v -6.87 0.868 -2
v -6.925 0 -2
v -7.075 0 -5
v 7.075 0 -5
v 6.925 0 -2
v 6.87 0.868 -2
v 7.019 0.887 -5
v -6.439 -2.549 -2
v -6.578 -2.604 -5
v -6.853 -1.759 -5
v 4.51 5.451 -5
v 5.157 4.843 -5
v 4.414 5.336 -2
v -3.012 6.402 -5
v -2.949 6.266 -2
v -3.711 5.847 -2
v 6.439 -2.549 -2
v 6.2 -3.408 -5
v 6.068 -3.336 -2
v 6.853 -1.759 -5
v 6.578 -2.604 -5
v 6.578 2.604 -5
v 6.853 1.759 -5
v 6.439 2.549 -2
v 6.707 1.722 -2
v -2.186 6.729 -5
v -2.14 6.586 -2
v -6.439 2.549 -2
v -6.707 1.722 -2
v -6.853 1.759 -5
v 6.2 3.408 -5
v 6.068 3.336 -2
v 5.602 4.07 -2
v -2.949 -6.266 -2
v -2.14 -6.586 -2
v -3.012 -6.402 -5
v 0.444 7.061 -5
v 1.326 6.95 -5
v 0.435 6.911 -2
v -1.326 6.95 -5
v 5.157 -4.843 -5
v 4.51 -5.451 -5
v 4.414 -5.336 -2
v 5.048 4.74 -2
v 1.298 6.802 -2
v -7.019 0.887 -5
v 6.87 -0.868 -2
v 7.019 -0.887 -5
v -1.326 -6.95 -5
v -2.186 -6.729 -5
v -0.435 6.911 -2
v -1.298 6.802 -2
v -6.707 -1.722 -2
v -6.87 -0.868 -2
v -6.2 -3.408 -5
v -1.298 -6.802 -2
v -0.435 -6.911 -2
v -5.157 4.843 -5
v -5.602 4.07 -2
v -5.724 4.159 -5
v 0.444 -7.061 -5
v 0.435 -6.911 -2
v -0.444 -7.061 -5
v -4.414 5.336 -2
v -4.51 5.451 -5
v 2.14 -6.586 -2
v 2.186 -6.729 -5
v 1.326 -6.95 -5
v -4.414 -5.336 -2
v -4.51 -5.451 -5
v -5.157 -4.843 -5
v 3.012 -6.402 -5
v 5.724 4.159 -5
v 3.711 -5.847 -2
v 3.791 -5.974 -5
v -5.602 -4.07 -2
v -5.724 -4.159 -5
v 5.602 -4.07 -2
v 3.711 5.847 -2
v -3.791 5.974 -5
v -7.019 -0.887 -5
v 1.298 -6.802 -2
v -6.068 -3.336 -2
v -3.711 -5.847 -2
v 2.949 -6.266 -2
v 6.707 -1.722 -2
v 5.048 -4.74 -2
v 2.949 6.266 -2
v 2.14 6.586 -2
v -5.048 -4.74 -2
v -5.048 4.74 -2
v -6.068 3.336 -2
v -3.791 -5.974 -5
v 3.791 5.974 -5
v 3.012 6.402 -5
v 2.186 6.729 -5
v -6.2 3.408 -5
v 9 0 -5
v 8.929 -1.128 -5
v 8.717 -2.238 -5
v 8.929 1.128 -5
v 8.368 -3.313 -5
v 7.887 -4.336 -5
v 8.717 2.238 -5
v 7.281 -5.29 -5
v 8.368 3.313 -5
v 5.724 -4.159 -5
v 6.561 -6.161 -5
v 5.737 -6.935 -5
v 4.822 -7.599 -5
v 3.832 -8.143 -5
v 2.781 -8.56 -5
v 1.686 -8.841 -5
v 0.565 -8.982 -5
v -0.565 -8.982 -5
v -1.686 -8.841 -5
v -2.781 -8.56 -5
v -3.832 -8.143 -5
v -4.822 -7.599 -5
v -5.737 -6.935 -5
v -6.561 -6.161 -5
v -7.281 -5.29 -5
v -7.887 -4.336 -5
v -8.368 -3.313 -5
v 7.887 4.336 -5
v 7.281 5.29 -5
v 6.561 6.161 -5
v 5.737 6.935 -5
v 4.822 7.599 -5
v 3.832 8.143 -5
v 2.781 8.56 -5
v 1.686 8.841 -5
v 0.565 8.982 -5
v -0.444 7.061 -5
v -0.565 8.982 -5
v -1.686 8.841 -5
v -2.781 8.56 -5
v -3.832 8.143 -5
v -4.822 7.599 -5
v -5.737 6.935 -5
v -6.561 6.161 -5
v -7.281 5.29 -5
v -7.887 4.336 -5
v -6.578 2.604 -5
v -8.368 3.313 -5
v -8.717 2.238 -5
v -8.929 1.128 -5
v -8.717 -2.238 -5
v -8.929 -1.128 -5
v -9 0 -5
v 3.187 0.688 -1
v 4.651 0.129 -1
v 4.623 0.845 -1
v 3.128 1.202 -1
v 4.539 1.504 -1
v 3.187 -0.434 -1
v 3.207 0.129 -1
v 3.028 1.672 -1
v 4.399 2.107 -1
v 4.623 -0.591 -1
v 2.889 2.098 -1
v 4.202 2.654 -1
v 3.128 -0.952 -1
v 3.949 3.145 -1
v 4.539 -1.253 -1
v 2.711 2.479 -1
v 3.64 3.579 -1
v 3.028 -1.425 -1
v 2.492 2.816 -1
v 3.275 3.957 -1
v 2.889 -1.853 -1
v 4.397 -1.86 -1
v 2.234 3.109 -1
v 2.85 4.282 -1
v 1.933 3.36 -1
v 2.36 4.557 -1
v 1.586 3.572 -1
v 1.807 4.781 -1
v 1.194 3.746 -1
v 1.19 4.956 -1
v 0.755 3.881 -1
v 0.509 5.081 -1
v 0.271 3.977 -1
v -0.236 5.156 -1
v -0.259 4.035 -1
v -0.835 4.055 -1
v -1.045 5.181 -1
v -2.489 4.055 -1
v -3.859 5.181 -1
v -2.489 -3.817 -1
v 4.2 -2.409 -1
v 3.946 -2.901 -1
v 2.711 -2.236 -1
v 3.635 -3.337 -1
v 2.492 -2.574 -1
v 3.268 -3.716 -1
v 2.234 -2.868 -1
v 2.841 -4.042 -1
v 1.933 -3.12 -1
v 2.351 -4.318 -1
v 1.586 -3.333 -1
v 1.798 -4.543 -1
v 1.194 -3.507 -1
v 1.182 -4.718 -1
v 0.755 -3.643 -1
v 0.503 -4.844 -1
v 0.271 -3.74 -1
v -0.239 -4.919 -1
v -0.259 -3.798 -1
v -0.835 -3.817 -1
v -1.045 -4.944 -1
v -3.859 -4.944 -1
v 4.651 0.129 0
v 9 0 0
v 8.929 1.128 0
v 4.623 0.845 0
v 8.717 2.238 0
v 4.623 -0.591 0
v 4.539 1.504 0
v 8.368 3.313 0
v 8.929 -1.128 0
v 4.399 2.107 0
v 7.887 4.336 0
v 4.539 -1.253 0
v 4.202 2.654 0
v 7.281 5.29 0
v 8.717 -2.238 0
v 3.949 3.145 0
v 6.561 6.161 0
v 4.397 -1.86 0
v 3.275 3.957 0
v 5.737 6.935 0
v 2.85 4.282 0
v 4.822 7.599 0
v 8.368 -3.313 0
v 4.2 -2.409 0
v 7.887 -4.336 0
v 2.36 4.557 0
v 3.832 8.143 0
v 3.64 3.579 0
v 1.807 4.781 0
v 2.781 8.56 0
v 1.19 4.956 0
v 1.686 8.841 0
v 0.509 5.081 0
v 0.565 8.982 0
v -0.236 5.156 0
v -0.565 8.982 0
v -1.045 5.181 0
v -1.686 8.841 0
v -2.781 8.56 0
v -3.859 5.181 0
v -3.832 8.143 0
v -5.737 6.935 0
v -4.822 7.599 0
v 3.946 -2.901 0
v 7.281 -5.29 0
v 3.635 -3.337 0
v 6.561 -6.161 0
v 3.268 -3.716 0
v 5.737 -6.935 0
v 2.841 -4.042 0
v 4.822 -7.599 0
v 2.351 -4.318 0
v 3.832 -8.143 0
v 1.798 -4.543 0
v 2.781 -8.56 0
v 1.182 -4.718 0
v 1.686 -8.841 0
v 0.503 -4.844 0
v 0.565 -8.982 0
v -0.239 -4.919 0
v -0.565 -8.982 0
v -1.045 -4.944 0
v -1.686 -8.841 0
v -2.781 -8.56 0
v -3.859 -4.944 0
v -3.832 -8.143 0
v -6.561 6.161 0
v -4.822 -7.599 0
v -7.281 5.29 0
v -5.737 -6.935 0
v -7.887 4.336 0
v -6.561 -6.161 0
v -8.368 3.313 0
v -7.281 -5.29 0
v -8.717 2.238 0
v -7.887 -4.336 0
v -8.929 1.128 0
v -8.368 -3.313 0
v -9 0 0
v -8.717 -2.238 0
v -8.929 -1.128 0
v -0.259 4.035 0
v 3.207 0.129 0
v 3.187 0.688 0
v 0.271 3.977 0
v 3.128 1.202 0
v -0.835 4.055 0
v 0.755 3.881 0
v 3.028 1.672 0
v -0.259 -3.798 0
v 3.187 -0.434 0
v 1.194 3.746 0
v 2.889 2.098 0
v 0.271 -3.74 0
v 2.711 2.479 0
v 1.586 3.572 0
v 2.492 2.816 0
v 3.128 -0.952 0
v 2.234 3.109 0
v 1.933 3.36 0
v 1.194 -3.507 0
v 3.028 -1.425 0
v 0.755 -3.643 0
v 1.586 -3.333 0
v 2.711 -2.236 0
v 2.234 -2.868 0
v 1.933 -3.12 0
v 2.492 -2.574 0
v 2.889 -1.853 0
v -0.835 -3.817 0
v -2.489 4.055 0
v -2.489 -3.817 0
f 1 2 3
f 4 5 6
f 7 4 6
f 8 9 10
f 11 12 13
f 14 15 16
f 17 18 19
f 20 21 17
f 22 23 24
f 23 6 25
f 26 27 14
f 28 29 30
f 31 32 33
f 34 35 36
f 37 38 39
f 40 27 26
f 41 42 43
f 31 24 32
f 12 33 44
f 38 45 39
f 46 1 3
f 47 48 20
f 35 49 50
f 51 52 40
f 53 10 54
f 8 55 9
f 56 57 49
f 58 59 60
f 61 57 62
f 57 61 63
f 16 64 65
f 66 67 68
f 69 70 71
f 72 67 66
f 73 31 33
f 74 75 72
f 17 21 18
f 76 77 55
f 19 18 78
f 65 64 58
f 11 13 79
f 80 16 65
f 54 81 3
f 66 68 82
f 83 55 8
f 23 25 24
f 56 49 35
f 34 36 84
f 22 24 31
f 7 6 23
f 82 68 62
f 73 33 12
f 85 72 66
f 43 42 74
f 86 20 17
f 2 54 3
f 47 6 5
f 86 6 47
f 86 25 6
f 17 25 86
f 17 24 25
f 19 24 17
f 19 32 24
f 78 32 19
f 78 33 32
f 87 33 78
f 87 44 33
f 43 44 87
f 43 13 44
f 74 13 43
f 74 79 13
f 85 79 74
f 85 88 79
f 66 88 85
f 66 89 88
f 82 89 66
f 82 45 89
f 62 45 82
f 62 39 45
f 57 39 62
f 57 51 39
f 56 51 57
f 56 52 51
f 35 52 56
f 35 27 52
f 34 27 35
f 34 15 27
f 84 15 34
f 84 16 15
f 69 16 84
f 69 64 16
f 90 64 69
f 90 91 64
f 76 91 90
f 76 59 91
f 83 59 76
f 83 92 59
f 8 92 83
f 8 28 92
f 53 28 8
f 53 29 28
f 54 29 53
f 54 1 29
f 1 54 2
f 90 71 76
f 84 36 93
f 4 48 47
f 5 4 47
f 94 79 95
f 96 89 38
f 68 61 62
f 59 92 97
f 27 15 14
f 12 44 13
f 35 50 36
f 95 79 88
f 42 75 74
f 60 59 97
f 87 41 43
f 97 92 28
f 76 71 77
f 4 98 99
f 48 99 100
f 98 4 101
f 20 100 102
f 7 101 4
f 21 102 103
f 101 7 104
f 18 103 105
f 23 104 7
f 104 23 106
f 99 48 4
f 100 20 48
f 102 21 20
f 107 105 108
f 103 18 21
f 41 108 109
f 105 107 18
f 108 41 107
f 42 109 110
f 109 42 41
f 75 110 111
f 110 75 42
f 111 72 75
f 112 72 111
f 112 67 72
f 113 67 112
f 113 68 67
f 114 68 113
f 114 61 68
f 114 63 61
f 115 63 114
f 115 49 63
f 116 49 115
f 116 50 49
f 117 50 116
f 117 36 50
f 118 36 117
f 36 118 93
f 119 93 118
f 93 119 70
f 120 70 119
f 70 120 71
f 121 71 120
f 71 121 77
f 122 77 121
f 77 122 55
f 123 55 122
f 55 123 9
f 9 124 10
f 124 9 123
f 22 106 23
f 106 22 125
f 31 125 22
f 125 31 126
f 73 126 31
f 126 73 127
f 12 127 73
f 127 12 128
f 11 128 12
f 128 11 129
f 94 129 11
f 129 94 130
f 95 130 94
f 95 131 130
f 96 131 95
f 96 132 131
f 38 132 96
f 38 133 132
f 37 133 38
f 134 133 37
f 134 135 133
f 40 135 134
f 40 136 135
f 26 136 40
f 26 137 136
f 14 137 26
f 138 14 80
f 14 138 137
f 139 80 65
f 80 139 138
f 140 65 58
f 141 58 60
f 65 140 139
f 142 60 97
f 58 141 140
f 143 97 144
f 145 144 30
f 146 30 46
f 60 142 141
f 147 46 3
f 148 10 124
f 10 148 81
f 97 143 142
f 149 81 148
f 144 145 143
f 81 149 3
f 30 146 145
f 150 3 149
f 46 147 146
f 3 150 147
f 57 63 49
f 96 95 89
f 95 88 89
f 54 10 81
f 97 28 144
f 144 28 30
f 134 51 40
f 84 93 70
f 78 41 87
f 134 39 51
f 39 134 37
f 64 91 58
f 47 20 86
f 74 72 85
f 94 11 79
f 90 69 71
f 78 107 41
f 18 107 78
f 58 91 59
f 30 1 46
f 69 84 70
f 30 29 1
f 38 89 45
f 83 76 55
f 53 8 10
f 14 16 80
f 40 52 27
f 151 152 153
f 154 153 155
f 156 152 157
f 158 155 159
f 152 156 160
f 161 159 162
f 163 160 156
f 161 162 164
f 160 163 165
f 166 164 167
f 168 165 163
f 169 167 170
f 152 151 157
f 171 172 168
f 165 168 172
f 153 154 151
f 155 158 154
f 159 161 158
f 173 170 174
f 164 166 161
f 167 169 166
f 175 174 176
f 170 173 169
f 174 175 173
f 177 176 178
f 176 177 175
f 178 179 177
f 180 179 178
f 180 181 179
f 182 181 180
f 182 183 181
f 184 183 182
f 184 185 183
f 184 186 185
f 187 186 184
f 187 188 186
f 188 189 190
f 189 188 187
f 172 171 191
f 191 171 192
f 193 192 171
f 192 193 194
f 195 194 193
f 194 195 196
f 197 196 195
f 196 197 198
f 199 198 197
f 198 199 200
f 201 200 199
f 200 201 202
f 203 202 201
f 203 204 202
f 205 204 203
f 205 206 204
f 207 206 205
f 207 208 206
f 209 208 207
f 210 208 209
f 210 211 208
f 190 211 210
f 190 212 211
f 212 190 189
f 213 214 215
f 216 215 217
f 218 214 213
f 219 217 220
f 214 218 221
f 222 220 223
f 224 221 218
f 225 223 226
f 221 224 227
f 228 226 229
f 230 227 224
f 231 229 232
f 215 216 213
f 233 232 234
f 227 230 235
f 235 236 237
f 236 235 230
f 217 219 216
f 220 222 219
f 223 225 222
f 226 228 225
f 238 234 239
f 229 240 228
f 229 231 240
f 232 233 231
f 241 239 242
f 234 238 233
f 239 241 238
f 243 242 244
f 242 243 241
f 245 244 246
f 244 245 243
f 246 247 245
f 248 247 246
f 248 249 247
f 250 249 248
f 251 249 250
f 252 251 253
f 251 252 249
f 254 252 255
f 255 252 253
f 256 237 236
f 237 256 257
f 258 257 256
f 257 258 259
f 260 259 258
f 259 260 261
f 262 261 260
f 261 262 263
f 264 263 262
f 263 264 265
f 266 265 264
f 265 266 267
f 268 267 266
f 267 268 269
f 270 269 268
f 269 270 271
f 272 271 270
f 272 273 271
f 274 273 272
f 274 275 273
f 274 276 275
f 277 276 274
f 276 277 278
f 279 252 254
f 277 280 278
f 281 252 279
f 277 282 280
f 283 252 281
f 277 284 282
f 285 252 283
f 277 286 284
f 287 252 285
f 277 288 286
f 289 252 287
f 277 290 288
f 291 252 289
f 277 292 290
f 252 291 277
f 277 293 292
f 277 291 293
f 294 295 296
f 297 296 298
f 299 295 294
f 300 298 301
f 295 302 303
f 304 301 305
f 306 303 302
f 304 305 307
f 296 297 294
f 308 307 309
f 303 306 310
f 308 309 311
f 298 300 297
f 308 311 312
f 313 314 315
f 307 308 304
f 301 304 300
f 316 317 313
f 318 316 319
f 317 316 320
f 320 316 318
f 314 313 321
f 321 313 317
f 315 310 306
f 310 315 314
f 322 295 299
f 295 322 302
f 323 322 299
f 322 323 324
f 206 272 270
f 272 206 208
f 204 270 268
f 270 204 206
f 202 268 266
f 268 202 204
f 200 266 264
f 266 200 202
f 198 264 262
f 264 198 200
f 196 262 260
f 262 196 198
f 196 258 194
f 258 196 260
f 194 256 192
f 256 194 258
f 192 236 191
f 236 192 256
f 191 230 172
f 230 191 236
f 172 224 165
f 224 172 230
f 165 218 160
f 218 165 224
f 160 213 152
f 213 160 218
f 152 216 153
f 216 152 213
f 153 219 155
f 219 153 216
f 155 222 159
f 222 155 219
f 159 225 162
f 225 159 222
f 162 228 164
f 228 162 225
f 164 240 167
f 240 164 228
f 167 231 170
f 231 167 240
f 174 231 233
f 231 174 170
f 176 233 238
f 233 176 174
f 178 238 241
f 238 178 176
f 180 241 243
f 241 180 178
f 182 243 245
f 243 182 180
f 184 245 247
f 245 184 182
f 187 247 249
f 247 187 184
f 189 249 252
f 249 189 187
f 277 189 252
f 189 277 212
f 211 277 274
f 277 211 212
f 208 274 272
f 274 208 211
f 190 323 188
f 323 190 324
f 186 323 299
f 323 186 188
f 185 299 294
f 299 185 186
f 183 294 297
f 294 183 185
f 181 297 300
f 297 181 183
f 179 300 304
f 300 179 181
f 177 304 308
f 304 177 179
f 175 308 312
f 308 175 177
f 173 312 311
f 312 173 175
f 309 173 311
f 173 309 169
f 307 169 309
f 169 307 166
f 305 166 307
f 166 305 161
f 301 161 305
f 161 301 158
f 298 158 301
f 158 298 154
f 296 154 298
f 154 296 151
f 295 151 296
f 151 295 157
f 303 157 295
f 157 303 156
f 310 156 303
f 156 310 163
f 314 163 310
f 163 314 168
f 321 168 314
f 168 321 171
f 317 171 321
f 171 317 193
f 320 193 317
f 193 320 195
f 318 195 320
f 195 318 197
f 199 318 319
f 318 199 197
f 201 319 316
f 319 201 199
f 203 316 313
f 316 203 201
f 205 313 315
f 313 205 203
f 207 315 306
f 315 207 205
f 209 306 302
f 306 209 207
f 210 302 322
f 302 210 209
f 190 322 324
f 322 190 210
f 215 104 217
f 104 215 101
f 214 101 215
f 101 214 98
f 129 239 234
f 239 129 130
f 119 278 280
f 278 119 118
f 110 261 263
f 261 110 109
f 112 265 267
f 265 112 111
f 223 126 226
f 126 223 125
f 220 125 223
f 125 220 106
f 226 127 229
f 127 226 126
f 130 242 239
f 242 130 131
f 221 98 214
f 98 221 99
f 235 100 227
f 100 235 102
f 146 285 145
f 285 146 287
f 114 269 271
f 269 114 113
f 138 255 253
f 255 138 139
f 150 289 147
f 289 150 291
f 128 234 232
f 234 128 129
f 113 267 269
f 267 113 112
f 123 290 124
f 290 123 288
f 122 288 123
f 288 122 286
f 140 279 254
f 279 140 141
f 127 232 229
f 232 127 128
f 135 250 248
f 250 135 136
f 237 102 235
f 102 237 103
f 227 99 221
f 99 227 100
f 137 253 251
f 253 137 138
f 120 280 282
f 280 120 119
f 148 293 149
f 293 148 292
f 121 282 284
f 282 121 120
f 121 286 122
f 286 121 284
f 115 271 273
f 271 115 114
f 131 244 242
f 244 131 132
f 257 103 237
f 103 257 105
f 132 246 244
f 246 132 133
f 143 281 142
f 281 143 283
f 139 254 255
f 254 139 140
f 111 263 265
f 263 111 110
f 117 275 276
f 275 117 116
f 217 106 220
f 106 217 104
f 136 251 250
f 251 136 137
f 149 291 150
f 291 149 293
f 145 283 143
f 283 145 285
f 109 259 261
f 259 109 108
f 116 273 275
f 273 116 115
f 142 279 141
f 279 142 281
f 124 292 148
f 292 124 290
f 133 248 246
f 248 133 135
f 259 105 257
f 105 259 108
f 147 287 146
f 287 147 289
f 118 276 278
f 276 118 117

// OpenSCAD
$fn = 50;

difference() {
	union() {
		translate(v = [0, 0, -5.0]) {
			cylinder(h = 5, r = 9.0);
		}
	}
	union() {
		#translate(v = [0, 0, -5.0]) {
			cylinder(h = 3, r1 = 7.075, r2 = 6.925);
		}
		translate(v = [0, 0, -1]) {
			linear_extrude(height = 1) {
				text(font = "Impact", halign = "center", size = 10, text = "D", valign = "center");
			}
		}
	}
}
